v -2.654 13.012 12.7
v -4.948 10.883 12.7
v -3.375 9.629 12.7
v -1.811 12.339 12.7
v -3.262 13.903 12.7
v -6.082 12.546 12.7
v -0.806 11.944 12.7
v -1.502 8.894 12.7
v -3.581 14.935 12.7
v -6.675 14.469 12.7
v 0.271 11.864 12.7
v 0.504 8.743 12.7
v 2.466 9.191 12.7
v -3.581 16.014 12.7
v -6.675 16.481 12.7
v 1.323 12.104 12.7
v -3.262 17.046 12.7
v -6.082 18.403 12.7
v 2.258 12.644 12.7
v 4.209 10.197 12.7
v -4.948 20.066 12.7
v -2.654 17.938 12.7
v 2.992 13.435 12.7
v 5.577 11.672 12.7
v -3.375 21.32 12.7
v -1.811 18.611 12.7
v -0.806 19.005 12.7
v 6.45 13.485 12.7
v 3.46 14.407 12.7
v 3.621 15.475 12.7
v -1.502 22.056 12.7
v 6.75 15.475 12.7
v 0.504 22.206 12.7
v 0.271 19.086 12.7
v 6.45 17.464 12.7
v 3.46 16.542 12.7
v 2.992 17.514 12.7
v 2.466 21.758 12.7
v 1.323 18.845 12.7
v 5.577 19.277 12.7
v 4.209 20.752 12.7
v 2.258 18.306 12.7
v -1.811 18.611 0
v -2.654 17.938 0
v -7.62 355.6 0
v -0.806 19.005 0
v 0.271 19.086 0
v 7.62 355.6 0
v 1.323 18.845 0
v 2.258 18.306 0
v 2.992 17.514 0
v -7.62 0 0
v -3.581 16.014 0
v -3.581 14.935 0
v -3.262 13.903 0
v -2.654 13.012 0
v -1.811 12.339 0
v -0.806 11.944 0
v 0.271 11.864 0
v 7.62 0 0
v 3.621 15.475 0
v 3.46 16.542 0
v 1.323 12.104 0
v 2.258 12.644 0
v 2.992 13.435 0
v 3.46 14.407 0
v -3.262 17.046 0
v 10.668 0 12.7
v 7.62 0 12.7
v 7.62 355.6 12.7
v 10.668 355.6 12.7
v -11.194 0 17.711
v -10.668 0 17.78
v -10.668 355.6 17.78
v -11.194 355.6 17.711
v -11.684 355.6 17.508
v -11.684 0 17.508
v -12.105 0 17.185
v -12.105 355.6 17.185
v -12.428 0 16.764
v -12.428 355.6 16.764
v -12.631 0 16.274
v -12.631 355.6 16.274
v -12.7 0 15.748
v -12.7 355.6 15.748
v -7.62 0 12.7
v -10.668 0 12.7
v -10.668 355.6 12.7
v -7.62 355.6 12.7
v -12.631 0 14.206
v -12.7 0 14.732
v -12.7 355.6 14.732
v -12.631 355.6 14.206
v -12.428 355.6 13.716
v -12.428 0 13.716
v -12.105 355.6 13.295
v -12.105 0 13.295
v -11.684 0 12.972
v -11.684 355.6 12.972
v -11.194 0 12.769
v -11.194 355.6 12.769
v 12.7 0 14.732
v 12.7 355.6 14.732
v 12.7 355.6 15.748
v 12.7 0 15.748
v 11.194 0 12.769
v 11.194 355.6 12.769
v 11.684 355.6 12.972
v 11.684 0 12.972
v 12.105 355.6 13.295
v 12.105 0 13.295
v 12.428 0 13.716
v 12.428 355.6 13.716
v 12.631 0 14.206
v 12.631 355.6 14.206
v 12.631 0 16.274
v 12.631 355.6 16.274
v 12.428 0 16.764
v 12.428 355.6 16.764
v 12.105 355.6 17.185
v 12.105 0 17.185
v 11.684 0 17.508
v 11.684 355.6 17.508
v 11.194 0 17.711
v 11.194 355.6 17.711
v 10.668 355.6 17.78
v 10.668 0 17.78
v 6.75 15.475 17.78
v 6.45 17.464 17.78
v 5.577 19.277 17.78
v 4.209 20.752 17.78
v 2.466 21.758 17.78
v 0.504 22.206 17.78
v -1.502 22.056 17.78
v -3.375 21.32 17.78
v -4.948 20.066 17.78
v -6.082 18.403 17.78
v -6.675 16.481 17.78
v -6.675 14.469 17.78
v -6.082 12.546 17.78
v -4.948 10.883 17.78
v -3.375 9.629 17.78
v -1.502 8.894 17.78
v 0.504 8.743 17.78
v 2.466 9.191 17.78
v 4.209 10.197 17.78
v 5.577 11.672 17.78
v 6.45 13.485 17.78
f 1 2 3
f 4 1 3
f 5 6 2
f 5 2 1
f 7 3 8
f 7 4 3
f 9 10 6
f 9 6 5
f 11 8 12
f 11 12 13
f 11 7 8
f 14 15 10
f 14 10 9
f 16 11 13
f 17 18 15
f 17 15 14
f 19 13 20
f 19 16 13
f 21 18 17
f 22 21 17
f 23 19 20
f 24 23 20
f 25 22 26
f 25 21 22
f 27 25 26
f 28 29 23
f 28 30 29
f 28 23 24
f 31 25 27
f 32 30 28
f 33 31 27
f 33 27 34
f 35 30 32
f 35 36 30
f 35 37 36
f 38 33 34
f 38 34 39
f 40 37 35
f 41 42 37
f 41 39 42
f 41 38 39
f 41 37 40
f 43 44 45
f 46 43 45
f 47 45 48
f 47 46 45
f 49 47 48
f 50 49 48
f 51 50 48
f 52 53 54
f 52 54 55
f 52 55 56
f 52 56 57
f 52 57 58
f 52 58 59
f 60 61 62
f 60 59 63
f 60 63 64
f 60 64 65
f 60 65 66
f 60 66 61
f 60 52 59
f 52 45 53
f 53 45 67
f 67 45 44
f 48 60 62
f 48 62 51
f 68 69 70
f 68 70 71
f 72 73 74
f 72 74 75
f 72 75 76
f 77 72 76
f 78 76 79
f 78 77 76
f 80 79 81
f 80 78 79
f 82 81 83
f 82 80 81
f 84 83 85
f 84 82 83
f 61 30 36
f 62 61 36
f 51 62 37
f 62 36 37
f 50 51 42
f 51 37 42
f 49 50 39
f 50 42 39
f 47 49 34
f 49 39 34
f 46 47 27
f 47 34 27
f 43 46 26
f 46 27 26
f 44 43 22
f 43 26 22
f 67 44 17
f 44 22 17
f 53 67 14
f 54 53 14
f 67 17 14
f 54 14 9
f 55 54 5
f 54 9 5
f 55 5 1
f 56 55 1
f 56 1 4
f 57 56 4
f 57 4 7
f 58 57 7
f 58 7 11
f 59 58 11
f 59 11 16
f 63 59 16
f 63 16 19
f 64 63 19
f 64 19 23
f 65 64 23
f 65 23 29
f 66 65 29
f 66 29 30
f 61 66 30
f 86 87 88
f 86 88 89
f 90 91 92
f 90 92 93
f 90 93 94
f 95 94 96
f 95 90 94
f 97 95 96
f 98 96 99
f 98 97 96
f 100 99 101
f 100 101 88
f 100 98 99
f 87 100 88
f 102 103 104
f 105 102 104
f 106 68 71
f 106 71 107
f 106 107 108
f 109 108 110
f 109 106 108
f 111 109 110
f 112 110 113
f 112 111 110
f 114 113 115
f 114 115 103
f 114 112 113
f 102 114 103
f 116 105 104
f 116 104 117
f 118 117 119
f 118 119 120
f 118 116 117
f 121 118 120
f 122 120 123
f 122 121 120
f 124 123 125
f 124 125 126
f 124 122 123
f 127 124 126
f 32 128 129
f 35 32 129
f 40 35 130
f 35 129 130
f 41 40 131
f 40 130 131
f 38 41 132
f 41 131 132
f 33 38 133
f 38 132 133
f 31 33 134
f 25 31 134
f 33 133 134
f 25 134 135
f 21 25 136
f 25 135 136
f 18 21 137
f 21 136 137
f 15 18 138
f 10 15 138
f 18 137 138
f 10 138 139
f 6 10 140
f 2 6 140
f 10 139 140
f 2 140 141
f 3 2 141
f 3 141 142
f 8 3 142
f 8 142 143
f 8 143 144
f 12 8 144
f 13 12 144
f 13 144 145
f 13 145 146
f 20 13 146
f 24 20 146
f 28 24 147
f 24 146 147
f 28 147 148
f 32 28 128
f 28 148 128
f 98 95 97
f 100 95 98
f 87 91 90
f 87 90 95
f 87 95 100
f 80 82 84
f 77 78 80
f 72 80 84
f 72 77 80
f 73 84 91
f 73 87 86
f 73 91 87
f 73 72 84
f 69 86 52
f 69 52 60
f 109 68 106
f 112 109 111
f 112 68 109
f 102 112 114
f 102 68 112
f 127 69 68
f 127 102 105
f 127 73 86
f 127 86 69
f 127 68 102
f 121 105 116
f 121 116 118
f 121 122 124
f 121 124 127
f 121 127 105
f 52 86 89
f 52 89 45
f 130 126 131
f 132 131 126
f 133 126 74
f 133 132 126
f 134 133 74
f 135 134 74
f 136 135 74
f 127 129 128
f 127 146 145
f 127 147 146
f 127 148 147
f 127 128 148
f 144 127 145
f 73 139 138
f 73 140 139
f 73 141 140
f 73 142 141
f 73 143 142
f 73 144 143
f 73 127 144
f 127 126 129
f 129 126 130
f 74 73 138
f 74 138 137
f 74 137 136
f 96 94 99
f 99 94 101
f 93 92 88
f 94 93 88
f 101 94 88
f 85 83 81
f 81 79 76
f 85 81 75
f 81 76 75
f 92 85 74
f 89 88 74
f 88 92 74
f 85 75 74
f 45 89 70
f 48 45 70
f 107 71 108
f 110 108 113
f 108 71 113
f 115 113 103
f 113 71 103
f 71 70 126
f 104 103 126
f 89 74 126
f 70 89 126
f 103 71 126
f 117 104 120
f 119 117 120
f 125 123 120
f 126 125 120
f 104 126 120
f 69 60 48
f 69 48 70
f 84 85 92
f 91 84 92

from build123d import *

# Parameters (mm, degrees)
F1_DEPTH = 355.6
F2_R     = 6.75023
F2_R_2   = 4.051718
F3_DEPTH = 5.08
F4_R     = 3.621045
F5_DEPTH = 25.4


with BuildPart() as f1:
    # F0 (on Front) → F1 (new body)
    with BuildSketch(Plane.XZ):
        with BuildLine():
            Line((10.668, 17.78), (0, 17.78))
            Line((0, 17.78), (-10.668, 17.78))
            ThreePointArc((-10.668, 17.78), (-12.104841, 17.184841), (-12.7, 15.748))
            Line((-12.7, 15.748), (-12.7, 14.732))
            ThreePointArc((-12.7, 14.732), (-12.104841, 13.295159), (-10.668, 12.7))
            Line((-10.668, 12.7), (-7.62, 12.7))
            Line((-7.62, 12.7), (-7.62, 0))
            Line((-7.62, 0), (0, 0))
            Line((0, 0), (7.62, 0))
            Line((7.62, 0), (7.62, 12.7))
            Line((7.62, 12.7), (10.668, 12.7))
            ThreePointArc((10.668, 12.7), (12.104841, 13.295159), (12.7, 14.732))
            Line((12.7, 14.732), (12.7, 15.748))
            ThreePointArc((12.7, 15.748), (12.104841, 17.184841), (10.668, 17.78))
        make_face()
    extrude(amount=-F1_DEPTH)

    # F2 (on face) → F3 (cut)
    with BuildSketch(Plane.XY.offset(17.78)):
        with Locations((0, 15.474608)):
            Circle(F2_R)
        with Locations((0, 15.474608)):
            Circle(F2_R_2, mode=Mode.SUBTRACT)
        with Locations((0, 15.474608)):
            Circle(F2_R_2)
    extrude(amount=-F3_DEPTH, mode=Mode.SUBTRACT)

    # F4 (on face) → F5 (cut)
    with BuildSketch(Plane.XY.offset(17.78)):
        with Locations((0, 15.474608)):
            Circle(F4_R)
    extrude(amount=-F5_DEPTH, mode=Mode.SUBTRACT)


solid = f1.part
